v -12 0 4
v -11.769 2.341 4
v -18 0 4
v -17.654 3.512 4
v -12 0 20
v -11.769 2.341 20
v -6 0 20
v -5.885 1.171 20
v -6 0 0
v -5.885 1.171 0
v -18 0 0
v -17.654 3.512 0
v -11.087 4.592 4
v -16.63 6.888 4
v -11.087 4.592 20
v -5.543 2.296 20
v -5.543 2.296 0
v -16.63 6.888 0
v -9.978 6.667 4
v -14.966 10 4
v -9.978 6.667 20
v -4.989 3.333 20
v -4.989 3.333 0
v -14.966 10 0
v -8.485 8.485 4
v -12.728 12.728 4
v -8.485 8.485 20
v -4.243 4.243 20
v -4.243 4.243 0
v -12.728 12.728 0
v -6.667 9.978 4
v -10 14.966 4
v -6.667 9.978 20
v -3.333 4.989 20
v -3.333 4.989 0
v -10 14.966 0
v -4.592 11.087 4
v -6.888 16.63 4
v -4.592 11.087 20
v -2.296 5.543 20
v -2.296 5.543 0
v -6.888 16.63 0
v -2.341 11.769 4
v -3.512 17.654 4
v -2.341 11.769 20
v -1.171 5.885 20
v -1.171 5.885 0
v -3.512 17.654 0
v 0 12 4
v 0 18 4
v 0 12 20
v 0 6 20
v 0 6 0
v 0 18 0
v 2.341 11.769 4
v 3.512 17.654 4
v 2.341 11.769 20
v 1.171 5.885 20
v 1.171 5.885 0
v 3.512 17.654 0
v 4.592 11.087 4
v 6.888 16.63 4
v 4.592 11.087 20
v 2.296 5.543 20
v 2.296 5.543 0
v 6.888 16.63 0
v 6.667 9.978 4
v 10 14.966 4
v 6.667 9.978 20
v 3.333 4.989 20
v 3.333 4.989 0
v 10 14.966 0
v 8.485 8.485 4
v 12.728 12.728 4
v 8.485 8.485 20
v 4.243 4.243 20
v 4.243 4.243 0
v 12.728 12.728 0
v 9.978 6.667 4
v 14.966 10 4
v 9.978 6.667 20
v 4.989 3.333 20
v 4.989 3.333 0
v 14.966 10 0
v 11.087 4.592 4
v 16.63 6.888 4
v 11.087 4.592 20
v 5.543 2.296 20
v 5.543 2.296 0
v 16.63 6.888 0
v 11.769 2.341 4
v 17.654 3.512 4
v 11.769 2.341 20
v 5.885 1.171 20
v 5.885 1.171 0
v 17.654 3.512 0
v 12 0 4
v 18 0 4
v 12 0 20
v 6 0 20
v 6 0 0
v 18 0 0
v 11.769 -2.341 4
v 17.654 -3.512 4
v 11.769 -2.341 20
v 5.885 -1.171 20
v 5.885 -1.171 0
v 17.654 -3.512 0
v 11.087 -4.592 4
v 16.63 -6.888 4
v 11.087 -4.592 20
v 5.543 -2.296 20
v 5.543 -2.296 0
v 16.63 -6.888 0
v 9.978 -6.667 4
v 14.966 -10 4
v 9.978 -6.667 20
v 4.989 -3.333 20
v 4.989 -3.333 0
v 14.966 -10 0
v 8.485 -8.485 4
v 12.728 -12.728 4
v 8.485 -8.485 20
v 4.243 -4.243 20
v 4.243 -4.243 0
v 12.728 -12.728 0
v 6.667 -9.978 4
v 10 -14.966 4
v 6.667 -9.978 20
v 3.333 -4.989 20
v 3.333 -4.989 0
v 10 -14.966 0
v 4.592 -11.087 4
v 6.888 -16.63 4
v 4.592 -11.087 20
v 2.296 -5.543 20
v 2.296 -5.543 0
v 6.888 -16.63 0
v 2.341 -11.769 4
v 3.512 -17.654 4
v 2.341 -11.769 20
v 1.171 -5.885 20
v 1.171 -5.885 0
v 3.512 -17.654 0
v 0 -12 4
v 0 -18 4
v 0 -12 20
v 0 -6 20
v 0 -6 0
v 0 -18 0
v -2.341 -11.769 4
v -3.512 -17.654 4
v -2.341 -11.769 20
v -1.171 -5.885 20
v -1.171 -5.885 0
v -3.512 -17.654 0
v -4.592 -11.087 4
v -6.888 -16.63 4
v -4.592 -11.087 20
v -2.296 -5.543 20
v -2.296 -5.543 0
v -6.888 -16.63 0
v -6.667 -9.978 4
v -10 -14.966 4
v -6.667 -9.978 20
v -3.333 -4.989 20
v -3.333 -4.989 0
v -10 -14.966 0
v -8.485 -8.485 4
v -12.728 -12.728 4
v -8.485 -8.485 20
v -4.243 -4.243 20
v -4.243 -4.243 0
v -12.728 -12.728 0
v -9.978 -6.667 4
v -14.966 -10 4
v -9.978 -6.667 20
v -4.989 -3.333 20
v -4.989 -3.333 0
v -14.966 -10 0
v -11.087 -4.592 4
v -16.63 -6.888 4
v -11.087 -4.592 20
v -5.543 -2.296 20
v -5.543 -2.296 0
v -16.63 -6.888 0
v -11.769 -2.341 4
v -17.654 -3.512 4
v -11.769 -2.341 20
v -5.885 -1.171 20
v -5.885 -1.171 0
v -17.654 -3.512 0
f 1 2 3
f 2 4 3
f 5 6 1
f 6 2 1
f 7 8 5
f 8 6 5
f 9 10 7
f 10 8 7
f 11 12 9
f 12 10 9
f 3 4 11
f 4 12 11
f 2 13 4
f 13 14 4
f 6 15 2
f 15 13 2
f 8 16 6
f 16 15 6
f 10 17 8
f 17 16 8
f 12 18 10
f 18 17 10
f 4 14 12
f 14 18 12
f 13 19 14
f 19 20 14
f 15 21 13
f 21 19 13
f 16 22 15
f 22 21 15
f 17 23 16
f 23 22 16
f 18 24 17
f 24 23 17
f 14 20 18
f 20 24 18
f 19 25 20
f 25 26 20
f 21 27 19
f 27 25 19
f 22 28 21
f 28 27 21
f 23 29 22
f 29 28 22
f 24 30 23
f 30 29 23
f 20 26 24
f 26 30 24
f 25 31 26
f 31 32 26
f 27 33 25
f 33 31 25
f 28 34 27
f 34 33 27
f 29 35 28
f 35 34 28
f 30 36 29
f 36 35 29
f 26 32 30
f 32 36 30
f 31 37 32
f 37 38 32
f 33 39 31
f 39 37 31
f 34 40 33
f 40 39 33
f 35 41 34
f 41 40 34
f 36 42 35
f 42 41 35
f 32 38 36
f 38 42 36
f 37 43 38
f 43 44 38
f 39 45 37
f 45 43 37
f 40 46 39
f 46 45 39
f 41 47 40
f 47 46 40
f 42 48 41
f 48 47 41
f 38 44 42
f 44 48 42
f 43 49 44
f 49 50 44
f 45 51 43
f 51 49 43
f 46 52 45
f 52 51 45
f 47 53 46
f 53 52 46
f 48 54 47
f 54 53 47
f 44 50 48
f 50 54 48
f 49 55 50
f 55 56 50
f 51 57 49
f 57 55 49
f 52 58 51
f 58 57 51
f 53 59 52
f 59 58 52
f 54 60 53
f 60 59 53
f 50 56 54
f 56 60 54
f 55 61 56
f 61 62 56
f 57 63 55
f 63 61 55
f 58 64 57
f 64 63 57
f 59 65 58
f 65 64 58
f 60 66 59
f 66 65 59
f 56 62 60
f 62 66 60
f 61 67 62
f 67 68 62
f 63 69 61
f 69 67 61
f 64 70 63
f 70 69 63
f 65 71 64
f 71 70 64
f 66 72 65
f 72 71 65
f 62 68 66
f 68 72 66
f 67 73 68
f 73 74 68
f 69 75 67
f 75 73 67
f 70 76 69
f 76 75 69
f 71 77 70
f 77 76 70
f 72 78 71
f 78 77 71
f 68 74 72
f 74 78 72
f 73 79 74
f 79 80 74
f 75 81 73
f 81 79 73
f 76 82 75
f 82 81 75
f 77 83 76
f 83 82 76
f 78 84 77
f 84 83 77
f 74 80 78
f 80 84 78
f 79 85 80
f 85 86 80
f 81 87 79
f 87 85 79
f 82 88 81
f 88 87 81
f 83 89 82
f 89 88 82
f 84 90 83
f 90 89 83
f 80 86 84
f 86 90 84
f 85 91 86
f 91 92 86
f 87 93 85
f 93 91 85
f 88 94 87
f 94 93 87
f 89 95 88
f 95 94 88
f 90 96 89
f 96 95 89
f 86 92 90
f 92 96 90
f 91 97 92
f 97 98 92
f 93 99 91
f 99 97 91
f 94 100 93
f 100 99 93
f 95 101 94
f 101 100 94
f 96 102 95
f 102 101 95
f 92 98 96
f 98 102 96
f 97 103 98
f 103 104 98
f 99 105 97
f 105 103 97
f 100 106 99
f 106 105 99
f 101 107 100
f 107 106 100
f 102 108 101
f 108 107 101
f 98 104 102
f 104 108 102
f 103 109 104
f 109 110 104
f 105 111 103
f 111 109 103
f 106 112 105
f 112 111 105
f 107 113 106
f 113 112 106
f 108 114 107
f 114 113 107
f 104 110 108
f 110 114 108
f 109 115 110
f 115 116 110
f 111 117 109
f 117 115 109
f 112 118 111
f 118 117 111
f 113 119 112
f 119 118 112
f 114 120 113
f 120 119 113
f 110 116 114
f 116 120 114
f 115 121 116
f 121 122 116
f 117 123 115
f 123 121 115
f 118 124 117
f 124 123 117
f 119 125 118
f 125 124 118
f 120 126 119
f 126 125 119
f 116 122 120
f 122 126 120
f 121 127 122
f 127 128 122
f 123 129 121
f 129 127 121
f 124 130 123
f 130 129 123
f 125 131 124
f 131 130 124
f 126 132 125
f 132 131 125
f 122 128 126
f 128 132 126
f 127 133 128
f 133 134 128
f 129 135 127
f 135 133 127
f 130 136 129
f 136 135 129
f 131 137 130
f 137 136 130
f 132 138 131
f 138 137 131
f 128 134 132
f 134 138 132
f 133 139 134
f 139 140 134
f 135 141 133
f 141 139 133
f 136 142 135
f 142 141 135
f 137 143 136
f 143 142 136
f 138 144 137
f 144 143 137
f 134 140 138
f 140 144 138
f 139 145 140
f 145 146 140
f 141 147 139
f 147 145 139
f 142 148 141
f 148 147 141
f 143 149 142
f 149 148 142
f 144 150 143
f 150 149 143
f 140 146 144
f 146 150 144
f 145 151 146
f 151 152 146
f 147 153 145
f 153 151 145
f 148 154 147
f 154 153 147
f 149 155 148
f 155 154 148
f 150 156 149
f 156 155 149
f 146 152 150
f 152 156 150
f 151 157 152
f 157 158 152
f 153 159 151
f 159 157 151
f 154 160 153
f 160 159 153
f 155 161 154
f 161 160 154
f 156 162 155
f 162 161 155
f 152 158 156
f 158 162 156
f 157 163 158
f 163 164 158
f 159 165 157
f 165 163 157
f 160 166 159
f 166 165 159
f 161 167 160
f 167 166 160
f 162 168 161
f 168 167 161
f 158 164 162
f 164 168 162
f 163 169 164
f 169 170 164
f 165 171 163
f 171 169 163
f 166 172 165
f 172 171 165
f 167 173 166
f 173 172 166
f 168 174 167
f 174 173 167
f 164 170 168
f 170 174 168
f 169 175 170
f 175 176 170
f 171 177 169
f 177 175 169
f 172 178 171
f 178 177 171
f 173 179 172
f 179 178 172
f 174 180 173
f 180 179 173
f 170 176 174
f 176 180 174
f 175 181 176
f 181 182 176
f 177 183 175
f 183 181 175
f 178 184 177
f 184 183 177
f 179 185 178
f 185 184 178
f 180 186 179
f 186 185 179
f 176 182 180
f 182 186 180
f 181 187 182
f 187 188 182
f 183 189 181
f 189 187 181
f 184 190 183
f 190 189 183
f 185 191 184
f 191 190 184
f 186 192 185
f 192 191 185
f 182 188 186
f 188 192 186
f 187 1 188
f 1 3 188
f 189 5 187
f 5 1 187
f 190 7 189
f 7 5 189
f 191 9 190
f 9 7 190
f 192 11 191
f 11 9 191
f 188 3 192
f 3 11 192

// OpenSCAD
$fn = 32;

// ----------------------------------------------------------------------
// Revolved part: flanged bushing R18
// ----------------------------------------------------------------------

// --- parameters (mm) ---
bore_r = 6;               // bore radius
flange_r = 18;            // flange radius
flange_h = 4;             // flange thickness
sleeve_r = 12;            // sleeve radius
total_h = 20;             // overall height
revolve_angle = 360;      // revolve sweep, degrees

bore_d = 2 * bore_r;
flange_d = 2 * flange_r;
sleeve_d = 2 * sleeve_r;

profile = [[6, 0], [18, 0], [18, 4], [12, 4], [12, 20], [6, 20]];  // primary outline, 6 points, counter clockwise

// --- the one profile operation ---
rotate_extrude(angle = revolve_angle) polygon(points = profile);
